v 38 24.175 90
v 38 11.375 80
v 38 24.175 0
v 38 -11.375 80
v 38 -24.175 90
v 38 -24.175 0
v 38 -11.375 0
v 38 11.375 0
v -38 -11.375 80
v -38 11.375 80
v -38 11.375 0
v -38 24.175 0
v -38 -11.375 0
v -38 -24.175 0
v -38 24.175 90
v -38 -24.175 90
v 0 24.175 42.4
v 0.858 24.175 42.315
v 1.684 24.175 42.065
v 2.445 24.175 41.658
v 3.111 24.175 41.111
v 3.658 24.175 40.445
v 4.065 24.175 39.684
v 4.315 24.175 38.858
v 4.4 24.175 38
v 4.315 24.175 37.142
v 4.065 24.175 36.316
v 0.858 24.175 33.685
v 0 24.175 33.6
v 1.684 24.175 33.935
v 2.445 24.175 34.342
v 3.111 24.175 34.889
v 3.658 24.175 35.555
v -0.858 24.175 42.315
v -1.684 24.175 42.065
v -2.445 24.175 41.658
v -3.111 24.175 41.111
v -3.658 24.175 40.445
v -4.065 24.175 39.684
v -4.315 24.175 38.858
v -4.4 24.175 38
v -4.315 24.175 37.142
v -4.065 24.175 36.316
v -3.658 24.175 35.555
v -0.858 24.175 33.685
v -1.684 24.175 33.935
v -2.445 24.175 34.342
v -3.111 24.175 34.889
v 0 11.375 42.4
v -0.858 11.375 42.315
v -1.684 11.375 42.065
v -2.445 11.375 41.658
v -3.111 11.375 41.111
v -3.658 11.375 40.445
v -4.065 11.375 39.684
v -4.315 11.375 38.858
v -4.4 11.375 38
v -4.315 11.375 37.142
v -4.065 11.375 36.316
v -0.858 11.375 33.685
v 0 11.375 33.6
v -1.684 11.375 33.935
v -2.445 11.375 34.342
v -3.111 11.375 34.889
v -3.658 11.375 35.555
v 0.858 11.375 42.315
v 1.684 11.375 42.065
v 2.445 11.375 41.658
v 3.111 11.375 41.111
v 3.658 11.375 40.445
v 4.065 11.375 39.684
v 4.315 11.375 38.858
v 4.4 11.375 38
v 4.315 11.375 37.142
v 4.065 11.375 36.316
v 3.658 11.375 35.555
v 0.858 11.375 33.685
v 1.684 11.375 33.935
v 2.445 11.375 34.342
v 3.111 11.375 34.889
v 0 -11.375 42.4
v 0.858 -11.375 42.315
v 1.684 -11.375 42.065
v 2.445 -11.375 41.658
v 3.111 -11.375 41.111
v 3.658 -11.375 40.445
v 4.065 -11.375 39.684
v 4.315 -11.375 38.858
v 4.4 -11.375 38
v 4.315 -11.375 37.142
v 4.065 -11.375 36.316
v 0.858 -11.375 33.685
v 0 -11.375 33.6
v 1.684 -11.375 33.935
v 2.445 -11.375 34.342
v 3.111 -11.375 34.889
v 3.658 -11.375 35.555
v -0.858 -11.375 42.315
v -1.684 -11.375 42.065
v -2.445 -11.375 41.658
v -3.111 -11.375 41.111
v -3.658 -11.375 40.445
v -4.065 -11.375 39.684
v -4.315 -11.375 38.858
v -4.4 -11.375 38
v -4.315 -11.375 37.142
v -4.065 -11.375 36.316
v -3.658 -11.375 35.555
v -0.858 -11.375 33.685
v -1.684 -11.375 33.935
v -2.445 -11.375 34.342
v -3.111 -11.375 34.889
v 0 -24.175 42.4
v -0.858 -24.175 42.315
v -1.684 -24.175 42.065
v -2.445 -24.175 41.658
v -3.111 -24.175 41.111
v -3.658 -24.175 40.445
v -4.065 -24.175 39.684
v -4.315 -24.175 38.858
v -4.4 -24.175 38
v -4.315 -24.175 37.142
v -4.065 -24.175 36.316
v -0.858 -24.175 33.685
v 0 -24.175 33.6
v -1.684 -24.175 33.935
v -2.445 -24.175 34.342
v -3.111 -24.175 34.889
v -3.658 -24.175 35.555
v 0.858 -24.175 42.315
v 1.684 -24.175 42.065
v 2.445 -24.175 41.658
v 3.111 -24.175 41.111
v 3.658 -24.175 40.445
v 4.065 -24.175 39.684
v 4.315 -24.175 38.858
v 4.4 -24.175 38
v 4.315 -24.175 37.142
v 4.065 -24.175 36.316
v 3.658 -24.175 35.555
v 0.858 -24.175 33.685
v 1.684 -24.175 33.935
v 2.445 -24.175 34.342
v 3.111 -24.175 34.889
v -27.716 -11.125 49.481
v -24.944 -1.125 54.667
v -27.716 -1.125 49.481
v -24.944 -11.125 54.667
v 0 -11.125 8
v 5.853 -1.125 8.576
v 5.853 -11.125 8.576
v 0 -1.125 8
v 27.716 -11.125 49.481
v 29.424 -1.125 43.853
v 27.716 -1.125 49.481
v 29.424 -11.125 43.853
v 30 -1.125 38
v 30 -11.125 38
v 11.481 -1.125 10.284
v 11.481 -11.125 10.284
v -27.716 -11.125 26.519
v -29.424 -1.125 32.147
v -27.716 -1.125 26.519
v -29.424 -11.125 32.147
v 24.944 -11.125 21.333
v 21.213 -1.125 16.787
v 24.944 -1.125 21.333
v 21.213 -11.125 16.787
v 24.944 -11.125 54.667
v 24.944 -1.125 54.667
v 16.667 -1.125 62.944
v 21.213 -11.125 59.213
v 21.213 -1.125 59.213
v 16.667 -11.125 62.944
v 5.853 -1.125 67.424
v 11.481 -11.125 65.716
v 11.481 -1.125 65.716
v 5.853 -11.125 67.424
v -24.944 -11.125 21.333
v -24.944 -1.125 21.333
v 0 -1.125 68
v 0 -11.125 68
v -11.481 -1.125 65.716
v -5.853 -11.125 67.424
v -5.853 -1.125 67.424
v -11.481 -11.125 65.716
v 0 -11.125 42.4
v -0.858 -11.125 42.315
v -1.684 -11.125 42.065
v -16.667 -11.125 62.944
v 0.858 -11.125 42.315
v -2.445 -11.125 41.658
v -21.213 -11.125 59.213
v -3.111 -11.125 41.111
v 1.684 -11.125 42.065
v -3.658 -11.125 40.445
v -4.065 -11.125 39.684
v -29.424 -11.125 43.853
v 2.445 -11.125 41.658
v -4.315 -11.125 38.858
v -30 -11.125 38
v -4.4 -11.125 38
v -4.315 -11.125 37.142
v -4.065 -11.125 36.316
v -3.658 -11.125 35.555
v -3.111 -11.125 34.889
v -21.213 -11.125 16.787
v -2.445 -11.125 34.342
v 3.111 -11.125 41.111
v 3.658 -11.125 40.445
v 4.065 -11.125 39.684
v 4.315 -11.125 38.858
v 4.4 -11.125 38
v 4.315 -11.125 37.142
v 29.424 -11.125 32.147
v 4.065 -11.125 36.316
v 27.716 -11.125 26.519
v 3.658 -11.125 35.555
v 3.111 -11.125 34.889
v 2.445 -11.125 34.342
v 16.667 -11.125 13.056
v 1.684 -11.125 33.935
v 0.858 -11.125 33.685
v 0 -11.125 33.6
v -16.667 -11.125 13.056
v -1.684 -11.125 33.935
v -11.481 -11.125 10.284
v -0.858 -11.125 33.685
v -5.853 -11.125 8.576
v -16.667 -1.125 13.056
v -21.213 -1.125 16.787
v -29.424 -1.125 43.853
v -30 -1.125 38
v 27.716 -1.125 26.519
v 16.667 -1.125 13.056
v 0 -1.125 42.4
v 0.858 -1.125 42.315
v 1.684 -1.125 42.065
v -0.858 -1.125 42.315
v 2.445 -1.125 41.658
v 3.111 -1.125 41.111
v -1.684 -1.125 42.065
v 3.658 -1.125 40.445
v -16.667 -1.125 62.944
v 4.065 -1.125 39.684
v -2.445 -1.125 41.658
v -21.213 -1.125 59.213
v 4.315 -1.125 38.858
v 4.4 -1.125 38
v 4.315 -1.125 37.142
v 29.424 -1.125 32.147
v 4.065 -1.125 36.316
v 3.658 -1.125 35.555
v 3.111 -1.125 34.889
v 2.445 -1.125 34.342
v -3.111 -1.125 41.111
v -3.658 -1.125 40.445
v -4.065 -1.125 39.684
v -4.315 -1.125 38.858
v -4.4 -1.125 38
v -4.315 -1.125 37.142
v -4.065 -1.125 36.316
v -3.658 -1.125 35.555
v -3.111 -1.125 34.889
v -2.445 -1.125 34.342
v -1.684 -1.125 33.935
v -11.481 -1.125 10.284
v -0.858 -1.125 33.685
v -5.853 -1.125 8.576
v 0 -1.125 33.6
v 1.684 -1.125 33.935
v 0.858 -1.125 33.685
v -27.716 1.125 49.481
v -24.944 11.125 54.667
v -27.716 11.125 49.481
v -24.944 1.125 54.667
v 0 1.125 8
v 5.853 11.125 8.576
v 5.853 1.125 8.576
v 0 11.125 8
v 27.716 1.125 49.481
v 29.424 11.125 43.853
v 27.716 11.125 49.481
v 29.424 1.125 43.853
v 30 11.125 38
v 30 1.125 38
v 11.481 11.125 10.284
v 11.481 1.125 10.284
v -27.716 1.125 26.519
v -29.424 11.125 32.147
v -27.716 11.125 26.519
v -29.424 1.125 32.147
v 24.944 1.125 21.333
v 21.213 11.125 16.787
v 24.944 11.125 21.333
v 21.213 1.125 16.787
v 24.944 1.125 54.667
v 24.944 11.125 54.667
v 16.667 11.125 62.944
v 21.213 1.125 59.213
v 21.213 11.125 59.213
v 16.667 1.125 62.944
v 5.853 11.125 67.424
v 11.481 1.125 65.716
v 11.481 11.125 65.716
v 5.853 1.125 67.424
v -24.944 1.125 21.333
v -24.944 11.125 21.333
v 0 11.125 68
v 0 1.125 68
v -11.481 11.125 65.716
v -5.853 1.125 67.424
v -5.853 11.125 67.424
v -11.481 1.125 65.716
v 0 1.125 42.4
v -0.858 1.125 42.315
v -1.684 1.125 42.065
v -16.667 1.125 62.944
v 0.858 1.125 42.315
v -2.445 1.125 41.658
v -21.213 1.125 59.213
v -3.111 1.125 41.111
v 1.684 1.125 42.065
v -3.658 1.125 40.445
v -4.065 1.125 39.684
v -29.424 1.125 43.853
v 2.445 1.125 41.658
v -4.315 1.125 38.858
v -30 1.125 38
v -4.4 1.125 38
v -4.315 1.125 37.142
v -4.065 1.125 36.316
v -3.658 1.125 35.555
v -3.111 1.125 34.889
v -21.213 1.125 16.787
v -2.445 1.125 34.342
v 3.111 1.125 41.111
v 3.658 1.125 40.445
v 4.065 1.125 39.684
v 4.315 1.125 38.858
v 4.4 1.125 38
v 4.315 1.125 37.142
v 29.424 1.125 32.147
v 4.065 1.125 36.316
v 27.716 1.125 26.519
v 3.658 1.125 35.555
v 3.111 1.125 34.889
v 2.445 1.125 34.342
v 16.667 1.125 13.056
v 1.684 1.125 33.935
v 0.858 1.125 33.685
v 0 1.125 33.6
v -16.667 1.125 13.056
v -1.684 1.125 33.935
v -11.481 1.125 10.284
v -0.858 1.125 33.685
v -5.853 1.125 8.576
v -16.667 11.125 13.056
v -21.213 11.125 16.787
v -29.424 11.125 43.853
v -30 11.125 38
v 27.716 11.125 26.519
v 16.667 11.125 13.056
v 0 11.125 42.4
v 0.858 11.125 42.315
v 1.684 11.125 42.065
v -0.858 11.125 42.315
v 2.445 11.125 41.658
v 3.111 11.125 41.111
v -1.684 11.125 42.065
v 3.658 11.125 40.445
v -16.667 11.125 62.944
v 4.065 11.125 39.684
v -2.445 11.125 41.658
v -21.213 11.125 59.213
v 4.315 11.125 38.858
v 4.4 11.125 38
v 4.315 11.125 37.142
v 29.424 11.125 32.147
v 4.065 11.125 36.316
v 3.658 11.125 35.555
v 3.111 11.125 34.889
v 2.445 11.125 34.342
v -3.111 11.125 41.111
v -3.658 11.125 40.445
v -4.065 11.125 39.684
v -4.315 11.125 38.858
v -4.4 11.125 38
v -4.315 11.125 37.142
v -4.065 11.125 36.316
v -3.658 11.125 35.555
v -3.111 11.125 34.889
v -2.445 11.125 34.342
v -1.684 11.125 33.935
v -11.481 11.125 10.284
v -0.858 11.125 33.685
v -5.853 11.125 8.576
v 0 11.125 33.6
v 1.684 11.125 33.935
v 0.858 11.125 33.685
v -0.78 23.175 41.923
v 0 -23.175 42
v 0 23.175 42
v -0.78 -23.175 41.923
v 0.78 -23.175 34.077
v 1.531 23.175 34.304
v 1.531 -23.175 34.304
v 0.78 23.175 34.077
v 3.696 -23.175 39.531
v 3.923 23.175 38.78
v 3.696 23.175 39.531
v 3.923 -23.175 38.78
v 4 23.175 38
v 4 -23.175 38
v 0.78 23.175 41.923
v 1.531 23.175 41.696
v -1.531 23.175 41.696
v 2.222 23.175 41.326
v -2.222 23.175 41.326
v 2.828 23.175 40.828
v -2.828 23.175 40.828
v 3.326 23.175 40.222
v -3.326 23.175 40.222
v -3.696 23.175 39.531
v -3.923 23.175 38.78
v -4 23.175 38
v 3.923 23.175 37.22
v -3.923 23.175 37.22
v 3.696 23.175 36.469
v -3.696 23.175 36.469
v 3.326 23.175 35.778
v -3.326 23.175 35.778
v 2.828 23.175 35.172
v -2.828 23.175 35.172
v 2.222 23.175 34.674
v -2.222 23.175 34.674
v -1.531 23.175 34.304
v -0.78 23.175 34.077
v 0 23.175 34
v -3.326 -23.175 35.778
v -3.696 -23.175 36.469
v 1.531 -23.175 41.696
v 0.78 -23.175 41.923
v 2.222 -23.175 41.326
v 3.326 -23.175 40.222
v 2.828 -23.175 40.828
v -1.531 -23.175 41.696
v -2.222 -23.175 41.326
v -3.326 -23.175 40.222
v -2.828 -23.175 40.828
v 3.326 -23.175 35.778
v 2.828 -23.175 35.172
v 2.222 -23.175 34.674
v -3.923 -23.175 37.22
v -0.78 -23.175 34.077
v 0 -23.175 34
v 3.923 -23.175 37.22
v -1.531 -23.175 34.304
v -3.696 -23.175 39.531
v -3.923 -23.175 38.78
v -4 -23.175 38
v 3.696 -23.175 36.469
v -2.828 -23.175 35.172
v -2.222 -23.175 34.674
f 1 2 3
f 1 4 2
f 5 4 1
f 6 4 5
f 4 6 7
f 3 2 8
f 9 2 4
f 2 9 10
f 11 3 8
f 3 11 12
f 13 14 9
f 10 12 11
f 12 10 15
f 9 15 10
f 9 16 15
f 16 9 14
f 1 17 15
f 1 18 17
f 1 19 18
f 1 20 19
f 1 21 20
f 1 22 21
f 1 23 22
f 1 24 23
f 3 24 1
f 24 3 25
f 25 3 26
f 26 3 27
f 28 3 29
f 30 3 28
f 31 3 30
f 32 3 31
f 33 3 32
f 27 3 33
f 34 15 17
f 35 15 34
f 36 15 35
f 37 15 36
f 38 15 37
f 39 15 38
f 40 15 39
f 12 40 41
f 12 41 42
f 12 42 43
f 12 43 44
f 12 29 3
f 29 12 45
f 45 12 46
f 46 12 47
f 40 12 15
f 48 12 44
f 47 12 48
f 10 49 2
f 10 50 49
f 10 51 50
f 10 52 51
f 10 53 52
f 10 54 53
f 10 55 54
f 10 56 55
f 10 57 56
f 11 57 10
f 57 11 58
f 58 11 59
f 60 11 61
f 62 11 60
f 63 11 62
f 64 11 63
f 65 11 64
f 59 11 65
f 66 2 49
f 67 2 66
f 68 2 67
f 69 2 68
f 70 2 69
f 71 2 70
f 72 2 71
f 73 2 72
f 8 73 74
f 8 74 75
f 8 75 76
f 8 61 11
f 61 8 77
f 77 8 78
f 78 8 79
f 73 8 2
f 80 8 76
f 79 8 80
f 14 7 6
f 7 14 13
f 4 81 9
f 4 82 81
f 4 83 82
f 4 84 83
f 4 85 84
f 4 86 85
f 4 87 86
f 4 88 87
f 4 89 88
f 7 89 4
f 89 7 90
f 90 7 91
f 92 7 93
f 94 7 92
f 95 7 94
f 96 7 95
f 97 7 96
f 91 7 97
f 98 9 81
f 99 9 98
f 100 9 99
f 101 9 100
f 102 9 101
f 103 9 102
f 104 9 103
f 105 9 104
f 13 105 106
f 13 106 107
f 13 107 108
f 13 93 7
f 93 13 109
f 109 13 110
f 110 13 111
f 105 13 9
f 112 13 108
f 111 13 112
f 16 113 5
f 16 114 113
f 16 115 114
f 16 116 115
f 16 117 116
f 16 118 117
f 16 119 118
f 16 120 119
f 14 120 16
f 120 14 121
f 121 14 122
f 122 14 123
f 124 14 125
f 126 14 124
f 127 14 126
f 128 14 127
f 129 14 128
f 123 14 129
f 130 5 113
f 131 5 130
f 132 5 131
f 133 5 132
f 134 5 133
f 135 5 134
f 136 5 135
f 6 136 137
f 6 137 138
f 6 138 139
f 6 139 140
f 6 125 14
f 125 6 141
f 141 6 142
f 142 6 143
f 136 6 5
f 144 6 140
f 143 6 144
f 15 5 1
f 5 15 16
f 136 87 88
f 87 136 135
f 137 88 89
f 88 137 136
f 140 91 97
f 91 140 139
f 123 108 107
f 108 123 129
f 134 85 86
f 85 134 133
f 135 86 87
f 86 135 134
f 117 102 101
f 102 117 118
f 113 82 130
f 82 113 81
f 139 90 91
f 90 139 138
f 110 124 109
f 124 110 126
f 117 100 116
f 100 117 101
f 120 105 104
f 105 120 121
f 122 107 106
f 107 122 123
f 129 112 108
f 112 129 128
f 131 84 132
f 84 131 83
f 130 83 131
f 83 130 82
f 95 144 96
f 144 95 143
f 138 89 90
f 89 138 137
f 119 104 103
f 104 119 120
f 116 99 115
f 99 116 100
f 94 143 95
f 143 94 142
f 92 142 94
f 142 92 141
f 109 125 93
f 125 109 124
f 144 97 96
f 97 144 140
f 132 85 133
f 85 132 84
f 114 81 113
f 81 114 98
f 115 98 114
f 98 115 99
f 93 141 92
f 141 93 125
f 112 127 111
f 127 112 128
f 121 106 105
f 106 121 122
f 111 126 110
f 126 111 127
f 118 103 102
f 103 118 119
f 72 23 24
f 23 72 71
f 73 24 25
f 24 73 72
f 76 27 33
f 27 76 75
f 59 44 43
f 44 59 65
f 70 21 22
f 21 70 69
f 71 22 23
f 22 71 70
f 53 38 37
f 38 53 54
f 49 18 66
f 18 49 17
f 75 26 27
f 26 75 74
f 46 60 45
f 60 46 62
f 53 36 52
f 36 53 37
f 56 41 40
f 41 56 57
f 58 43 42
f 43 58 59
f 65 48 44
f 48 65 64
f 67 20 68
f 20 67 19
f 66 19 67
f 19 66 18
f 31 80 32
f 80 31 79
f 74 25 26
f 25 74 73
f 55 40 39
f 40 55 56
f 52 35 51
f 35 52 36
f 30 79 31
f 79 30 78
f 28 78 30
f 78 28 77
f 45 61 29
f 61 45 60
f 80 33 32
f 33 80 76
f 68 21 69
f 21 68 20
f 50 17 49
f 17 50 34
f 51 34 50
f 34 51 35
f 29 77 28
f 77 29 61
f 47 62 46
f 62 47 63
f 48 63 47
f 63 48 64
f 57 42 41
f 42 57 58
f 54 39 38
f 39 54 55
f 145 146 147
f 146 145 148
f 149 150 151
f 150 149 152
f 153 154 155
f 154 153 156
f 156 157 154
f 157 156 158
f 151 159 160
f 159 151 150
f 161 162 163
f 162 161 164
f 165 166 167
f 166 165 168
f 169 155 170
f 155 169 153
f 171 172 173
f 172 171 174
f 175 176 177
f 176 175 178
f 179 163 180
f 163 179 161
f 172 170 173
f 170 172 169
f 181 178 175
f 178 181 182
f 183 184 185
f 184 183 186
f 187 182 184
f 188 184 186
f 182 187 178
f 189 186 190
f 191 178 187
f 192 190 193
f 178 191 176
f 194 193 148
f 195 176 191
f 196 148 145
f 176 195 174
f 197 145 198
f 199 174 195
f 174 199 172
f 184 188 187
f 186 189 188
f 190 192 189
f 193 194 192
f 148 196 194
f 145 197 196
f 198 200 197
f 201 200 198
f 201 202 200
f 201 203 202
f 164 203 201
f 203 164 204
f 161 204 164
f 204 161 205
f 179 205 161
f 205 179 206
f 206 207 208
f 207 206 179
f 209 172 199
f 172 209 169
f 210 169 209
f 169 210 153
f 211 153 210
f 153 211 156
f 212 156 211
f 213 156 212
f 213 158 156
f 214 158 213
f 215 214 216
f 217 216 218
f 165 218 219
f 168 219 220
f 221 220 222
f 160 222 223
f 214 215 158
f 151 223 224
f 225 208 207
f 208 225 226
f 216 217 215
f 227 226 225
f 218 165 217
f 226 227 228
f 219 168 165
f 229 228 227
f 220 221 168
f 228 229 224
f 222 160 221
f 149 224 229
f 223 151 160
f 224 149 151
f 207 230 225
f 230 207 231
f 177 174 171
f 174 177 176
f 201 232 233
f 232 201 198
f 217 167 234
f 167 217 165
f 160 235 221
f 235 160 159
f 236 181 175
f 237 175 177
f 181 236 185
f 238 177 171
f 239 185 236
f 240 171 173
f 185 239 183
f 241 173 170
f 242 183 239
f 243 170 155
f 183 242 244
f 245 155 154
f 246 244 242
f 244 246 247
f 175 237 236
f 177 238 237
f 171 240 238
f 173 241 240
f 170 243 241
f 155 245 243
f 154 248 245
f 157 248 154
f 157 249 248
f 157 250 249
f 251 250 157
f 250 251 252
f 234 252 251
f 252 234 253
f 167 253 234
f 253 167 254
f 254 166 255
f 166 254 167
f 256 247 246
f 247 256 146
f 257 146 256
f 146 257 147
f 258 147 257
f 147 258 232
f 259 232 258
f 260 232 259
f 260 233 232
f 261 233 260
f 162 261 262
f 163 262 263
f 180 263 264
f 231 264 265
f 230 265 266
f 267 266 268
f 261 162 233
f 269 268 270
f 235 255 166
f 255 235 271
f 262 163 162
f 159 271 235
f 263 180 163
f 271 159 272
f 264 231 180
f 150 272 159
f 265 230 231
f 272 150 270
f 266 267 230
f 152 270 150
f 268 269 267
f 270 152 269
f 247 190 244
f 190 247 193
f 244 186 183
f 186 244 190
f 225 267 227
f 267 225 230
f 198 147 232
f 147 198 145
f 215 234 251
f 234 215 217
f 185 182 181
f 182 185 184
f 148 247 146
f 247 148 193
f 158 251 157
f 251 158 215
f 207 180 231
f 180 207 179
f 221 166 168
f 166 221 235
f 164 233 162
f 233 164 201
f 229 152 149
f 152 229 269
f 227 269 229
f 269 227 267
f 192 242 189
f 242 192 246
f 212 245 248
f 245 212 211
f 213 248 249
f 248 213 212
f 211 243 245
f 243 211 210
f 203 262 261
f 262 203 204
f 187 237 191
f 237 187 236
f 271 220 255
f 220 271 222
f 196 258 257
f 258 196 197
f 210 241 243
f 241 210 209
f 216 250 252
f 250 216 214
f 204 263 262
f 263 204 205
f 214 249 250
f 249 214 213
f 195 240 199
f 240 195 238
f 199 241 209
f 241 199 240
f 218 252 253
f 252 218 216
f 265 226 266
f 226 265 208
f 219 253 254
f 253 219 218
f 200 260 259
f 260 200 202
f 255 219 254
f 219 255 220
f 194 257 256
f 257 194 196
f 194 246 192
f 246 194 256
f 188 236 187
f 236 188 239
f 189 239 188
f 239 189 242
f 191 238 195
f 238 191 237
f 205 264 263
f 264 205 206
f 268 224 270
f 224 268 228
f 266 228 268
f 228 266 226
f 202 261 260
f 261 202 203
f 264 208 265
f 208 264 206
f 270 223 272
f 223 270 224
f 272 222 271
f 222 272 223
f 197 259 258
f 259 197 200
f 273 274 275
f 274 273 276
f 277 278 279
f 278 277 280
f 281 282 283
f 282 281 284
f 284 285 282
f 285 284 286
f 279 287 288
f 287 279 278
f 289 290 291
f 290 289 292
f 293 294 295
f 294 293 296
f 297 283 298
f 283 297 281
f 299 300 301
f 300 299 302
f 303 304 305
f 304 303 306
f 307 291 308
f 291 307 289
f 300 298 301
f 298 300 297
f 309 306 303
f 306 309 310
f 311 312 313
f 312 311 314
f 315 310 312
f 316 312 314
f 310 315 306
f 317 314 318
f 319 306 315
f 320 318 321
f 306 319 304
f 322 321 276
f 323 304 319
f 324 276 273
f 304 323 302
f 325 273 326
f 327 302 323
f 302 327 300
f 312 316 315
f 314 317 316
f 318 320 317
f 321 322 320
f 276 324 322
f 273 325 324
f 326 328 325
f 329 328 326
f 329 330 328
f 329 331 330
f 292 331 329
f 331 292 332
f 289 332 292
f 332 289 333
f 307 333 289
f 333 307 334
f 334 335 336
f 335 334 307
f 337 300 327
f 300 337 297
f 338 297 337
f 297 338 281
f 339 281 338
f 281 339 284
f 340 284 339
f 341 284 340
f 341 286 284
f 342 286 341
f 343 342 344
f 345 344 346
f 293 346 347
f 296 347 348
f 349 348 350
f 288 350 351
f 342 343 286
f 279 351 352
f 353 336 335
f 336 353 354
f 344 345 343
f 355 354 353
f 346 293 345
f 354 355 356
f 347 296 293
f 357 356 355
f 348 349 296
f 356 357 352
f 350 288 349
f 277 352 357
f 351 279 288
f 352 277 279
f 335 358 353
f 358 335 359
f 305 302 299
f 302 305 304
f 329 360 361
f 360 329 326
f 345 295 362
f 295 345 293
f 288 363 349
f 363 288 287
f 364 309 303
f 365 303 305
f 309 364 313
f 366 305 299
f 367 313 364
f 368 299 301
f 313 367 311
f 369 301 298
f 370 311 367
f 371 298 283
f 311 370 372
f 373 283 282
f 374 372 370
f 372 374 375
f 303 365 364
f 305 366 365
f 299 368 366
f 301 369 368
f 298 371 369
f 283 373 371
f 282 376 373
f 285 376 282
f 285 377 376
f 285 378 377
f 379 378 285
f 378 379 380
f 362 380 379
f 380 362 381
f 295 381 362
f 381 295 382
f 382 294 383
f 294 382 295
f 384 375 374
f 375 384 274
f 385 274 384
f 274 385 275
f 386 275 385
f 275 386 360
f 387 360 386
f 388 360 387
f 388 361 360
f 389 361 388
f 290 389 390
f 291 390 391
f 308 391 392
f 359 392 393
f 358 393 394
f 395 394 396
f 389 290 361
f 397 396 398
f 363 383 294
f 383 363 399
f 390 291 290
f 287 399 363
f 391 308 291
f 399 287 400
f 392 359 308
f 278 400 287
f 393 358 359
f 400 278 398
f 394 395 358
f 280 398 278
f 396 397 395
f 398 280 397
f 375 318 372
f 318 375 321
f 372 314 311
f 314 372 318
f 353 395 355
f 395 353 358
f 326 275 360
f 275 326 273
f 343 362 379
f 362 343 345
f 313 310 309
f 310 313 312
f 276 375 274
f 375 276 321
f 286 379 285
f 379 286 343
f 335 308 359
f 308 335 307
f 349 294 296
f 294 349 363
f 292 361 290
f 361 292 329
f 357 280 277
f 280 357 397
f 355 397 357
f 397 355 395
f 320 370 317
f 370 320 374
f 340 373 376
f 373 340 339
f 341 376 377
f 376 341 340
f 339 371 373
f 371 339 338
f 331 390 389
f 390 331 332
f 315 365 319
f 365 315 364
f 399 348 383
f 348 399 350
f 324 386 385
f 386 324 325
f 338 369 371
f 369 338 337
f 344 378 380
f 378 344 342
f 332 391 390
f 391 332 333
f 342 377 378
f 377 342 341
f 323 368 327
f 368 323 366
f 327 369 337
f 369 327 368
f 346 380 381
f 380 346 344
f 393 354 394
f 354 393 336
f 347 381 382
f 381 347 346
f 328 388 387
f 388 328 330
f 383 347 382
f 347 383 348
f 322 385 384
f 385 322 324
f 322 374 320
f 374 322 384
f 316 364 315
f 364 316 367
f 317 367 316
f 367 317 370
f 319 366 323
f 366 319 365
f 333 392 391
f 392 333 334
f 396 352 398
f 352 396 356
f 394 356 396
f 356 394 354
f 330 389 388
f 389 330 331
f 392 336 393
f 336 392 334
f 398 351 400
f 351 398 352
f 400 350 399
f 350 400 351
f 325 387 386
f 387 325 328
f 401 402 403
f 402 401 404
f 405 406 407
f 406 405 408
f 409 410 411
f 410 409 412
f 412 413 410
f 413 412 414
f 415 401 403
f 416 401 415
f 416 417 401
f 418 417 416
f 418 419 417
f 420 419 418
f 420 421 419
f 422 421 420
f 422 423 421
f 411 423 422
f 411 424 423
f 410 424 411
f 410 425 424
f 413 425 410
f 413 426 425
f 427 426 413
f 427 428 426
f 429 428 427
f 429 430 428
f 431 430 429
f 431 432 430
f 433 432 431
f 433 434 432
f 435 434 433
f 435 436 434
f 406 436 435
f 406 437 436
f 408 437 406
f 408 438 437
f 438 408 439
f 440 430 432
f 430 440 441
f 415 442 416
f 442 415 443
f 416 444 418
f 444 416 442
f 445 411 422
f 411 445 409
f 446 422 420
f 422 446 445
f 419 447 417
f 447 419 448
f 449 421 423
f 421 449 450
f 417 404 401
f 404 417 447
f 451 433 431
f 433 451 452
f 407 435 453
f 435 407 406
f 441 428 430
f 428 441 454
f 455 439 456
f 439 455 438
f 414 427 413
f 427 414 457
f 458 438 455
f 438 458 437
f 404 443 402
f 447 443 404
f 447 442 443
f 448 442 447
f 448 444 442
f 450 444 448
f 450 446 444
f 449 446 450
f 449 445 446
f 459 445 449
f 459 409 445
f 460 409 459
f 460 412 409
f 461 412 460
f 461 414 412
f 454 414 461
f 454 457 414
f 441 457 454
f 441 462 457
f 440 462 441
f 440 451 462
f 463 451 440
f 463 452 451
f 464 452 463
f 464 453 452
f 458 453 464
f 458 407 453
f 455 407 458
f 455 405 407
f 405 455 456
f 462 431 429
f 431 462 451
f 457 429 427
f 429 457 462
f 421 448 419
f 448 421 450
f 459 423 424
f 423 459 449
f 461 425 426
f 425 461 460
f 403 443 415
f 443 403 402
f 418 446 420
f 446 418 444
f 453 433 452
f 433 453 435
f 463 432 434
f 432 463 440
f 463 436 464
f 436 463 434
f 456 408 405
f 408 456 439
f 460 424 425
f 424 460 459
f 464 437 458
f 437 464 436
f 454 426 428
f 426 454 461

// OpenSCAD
$fn = 32;

// ------------------------------------------------------------------------
// Trolley wheel set: wheels d60, fork 80 mm tall
// Every part is its own module, assembly() places every instance.
// ------------------------------------------------------------------------

// --- part 1 ---
module trolley_fork() {
  difference() {
    union() {
      translate([-38, 11.375, 0]) cube([76, 12.8, 80]);
      translate([-38, -24.175, 0]) cube([76, 12.8, 80]);
      translate([-38, -24.175, 80]) cube([76, 48.35, 10]);
    }
    translate([0, -17.775, 38]) rotate([90, 0, 0]) cylinder(h = 14.8, d = 8.8, center = true);
    translate([0, 17.775, 38]) rotate([90, 0, 0]) cylinder(h = 14.8, d = 8.8, center = true);
  }
}

// --- part 2 ---
module trolley_wheel() {
  difference() {
      translate([0, 0, 0]) cylinder(h = 10, d = 60);
      translate([0, 0, -1]) cylinder(h = 12, d = 8.8);
    }
}

// --- part 3 ---
module trolley_axle() {
  translate([0, 0, -23.175]) cylinder(h = 46.35, d = 8);
}

// --- assembly ---
module assembly() {
  color([0.80, 0.24, 0.20]) translate([0, 0, 0]) rotate([0, 0, 0]) trolley_fork();
  color([0.20, 0.45, 0.75]) translate([0, -1.125, 38]) rotate([90, 0, 0]) trolley_wheel();
  color([0.25, 0.62, 0.32]) translate([0, 11.125, 38]) rotate([90, 0, 0]) trolley_wheel();
  color([0.92, 0.70, 0.18]) translate([0, 0, 38]) rotate([90, 0, 0]) trolley_axle();
}

assembly();
